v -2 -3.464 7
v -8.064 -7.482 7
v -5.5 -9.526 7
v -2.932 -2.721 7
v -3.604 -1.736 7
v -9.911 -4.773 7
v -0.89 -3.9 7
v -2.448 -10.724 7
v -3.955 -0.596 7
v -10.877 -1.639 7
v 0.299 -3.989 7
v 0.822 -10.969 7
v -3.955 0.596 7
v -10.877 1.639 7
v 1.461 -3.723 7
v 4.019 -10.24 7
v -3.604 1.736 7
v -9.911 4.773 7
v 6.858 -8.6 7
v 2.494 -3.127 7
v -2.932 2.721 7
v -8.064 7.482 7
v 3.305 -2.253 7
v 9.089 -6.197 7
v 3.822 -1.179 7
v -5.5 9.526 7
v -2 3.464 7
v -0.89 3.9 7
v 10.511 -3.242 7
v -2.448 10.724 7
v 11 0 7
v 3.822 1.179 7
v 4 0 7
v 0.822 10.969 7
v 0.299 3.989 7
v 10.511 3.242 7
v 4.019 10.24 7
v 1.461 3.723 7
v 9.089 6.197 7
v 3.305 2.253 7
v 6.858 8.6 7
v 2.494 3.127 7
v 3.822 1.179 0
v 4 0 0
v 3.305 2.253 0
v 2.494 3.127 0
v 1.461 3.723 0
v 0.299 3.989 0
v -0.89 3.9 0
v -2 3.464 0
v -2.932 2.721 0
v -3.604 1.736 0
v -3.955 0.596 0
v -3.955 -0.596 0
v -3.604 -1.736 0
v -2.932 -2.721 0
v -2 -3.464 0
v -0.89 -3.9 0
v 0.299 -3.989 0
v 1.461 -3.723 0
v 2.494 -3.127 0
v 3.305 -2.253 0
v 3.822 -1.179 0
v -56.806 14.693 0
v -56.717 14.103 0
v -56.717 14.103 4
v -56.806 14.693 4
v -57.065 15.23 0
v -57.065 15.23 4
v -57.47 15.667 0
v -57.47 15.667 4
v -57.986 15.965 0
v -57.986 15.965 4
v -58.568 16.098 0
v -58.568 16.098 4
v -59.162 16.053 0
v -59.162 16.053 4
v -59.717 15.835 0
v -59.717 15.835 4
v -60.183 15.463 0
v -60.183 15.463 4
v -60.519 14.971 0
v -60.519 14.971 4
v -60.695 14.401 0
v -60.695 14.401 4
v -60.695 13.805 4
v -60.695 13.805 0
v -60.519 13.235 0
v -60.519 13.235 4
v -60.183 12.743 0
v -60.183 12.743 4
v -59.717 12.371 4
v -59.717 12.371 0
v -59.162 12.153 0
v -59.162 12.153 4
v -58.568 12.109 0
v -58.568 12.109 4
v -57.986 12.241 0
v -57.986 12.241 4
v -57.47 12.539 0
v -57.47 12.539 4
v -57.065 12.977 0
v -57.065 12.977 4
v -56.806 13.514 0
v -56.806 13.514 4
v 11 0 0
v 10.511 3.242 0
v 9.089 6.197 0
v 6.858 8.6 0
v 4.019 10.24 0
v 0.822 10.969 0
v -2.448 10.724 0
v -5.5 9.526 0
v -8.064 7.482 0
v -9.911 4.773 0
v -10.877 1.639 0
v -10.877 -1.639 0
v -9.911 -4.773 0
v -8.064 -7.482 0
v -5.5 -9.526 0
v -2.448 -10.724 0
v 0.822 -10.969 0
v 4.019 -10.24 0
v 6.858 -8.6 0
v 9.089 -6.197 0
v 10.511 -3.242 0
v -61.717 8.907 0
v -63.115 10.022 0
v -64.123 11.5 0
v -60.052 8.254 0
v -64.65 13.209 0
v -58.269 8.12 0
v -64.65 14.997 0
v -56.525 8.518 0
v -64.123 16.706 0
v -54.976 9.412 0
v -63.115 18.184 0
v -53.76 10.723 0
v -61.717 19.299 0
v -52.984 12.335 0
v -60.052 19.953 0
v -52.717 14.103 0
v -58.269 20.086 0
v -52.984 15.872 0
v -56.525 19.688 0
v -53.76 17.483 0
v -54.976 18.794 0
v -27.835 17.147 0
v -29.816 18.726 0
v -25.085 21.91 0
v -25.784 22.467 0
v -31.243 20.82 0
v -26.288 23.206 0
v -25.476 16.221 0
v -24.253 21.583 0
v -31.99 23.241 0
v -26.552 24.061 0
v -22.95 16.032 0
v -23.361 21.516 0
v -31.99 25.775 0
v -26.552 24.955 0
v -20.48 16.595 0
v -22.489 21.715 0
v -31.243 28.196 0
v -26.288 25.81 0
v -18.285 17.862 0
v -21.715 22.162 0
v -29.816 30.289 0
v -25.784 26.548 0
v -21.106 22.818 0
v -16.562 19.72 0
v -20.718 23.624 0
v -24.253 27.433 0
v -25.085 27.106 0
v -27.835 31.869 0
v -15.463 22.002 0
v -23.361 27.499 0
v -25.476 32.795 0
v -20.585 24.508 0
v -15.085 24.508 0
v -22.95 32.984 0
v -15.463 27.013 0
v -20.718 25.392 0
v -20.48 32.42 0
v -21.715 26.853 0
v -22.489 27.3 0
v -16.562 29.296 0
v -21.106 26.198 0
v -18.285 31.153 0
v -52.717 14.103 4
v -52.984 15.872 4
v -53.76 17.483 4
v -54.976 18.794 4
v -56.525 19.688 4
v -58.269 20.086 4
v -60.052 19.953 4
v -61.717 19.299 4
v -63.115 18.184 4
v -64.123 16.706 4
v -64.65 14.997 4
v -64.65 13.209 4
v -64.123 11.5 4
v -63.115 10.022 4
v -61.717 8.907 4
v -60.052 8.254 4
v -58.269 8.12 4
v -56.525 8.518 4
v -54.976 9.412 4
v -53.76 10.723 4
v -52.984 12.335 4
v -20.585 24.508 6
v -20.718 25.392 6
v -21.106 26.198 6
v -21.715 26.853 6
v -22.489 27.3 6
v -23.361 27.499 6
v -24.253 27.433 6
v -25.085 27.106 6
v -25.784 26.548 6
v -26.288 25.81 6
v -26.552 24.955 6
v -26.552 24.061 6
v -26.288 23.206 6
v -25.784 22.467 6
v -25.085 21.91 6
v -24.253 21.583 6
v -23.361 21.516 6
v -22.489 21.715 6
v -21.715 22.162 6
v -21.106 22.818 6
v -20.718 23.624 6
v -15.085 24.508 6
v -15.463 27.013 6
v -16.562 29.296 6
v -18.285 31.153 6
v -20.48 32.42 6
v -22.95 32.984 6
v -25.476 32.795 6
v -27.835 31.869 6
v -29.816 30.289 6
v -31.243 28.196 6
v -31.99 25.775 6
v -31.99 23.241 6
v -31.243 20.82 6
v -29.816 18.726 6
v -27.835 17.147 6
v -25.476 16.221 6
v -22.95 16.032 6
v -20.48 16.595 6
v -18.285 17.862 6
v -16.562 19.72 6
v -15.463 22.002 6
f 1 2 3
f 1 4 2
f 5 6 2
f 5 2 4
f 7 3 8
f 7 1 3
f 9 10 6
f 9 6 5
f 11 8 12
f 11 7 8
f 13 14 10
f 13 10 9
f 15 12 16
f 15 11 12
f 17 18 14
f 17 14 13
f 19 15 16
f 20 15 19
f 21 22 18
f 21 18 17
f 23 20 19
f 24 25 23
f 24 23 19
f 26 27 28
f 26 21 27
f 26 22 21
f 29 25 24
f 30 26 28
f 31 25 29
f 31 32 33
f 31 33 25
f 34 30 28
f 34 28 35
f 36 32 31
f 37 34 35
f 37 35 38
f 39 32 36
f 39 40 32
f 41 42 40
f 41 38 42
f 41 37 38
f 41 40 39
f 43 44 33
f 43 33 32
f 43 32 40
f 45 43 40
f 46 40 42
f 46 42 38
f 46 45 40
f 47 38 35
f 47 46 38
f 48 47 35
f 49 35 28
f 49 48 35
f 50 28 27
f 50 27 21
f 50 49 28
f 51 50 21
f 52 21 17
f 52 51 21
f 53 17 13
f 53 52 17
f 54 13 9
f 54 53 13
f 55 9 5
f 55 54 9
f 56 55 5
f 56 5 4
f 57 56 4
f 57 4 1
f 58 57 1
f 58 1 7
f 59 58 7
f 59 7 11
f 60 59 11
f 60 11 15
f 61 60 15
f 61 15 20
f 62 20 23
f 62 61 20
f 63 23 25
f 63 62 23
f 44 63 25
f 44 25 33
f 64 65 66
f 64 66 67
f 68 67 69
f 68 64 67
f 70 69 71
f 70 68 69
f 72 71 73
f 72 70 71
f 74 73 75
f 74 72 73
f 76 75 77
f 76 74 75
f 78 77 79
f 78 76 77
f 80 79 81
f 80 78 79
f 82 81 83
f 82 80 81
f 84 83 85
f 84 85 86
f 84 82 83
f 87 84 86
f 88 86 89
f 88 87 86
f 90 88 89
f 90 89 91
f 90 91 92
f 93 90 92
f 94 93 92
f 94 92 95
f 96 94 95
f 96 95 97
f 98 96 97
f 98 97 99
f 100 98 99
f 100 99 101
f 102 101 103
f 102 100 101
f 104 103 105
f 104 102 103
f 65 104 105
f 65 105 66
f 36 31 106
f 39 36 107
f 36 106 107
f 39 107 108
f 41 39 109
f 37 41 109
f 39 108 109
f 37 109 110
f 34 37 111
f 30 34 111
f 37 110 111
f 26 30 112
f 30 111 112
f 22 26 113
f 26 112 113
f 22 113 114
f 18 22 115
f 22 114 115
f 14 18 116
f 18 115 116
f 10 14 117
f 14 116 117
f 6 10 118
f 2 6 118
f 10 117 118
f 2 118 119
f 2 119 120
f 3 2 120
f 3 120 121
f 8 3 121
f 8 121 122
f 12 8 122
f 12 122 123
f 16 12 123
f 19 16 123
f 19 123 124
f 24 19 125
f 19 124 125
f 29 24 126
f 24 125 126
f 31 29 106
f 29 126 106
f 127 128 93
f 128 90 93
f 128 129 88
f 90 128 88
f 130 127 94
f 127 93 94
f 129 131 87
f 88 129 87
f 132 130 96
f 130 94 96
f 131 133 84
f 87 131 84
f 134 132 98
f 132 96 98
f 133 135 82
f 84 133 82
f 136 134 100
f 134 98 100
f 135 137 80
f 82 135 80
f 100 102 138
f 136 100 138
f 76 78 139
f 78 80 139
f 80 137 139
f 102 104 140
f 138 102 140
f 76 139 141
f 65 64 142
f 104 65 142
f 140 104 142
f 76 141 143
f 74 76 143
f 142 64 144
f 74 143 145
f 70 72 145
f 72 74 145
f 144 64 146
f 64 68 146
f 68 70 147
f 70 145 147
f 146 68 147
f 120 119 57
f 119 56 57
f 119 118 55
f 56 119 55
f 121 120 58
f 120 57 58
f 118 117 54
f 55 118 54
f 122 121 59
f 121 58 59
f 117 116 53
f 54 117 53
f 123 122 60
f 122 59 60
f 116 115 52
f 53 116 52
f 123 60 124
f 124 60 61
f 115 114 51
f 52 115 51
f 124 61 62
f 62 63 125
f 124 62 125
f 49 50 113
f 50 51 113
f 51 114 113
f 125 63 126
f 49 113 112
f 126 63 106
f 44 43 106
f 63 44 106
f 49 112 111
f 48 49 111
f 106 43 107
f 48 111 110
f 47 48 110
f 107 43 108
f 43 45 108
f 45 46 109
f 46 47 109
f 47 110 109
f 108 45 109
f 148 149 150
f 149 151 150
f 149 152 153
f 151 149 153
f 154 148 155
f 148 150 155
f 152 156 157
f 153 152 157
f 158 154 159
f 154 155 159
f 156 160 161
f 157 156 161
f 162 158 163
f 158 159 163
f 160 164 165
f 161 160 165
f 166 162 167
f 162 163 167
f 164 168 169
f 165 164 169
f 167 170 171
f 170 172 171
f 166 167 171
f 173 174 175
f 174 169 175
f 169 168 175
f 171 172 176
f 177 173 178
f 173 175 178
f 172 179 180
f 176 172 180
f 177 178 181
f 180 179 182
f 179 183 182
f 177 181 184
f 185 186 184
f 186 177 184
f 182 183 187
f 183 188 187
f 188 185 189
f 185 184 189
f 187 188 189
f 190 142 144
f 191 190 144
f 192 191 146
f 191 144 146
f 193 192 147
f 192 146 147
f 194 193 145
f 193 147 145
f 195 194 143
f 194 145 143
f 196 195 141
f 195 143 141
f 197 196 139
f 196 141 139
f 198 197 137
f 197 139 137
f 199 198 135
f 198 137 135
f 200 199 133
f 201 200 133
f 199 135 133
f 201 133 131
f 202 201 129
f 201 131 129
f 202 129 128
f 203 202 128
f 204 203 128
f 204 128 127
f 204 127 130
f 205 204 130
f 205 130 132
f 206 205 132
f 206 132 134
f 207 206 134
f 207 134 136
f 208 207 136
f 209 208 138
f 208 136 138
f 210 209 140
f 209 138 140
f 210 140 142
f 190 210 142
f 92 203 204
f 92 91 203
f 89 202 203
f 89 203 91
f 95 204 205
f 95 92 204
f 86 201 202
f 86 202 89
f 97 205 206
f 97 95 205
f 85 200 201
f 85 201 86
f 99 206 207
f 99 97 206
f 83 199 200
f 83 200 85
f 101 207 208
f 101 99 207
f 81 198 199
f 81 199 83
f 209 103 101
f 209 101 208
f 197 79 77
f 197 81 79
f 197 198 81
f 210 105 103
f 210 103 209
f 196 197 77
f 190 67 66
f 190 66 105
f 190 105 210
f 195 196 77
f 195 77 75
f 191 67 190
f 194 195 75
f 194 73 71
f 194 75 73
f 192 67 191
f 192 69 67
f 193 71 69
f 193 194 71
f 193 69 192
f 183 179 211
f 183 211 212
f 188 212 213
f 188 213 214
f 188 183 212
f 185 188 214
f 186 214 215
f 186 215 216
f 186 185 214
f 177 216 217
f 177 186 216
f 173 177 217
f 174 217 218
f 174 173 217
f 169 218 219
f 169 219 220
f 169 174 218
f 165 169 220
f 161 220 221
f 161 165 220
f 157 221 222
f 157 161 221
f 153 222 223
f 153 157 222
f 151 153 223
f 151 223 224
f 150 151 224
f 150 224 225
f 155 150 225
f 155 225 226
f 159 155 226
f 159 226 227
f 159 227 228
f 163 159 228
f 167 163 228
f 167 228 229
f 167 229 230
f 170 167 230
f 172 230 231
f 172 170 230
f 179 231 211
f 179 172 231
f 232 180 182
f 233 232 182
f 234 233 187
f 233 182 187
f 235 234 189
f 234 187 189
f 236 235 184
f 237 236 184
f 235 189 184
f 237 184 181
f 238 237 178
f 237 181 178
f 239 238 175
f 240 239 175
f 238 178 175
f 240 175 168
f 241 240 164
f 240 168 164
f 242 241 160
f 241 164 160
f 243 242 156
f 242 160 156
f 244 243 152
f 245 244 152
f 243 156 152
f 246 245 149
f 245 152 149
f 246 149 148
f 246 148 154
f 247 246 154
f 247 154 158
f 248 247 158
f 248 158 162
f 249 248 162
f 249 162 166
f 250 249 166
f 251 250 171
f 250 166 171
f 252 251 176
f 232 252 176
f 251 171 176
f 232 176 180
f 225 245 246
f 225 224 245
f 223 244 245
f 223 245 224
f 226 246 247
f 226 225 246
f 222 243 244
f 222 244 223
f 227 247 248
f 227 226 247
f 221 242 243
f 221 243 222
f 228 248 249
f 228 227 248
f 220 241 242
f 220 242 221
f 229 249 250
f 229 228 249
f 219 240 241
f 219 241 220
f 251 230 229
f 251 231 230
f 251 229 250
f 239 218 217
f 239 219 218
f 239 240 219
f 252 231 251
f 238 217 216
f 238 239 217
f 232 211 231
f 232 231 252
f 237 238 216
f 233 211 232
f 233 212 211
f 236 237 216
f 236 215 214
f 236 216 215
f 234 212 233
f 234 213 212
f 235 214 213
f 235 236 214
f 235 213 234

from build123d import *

# Parameters (mm, degrees)
F0_R     = 11
F0_R_2   = 4
F1_DEPTH = 7
F0_R_3   = 6
F0_R_4   = 2
F2_DEPTH = 4
F0_R_5   = 8.5
F0_R_6   = 3
F3_DEPTH = 6


with BuildPart() as f1:
    # F0 (on Top) → F1 (new body)
    with BuildSketch(Plane.XY):
        Circle(F0_R)
        Circle(F0_R_2, mode=Mode.SUBTRACT)
    extrude(amount=F1_DEPTH)


with BuildPart() as f2:
    # F0 (on Top) → F2 (new body)
    with BuildSketch(Plane.XY):
        with Locations((-58.717016, 14.103145)):
            Circle(F0_R_3)
        with Locations((-58.717016, 14.103145)):
            Circle(F0_R_4, mode=Mode.SUBTRACT)
    extrude(amount=F2_DEPTH)


with BuildPart() as f3:
    # F0 (on Top) → F3 (new body)
    with BuildSketch(Plane.XY):
        with Locations((-23.585057, 24.507875)):
            Circle(F0_R_5)
        with Locations((-23.585057, 24.507875)):
            Circle(F0_R_6, mode=Mode.SUBTRACT)
    extrude(amount=F3_DEPTH)


solid = Compound([f1.part, f2.part, f3.part])
